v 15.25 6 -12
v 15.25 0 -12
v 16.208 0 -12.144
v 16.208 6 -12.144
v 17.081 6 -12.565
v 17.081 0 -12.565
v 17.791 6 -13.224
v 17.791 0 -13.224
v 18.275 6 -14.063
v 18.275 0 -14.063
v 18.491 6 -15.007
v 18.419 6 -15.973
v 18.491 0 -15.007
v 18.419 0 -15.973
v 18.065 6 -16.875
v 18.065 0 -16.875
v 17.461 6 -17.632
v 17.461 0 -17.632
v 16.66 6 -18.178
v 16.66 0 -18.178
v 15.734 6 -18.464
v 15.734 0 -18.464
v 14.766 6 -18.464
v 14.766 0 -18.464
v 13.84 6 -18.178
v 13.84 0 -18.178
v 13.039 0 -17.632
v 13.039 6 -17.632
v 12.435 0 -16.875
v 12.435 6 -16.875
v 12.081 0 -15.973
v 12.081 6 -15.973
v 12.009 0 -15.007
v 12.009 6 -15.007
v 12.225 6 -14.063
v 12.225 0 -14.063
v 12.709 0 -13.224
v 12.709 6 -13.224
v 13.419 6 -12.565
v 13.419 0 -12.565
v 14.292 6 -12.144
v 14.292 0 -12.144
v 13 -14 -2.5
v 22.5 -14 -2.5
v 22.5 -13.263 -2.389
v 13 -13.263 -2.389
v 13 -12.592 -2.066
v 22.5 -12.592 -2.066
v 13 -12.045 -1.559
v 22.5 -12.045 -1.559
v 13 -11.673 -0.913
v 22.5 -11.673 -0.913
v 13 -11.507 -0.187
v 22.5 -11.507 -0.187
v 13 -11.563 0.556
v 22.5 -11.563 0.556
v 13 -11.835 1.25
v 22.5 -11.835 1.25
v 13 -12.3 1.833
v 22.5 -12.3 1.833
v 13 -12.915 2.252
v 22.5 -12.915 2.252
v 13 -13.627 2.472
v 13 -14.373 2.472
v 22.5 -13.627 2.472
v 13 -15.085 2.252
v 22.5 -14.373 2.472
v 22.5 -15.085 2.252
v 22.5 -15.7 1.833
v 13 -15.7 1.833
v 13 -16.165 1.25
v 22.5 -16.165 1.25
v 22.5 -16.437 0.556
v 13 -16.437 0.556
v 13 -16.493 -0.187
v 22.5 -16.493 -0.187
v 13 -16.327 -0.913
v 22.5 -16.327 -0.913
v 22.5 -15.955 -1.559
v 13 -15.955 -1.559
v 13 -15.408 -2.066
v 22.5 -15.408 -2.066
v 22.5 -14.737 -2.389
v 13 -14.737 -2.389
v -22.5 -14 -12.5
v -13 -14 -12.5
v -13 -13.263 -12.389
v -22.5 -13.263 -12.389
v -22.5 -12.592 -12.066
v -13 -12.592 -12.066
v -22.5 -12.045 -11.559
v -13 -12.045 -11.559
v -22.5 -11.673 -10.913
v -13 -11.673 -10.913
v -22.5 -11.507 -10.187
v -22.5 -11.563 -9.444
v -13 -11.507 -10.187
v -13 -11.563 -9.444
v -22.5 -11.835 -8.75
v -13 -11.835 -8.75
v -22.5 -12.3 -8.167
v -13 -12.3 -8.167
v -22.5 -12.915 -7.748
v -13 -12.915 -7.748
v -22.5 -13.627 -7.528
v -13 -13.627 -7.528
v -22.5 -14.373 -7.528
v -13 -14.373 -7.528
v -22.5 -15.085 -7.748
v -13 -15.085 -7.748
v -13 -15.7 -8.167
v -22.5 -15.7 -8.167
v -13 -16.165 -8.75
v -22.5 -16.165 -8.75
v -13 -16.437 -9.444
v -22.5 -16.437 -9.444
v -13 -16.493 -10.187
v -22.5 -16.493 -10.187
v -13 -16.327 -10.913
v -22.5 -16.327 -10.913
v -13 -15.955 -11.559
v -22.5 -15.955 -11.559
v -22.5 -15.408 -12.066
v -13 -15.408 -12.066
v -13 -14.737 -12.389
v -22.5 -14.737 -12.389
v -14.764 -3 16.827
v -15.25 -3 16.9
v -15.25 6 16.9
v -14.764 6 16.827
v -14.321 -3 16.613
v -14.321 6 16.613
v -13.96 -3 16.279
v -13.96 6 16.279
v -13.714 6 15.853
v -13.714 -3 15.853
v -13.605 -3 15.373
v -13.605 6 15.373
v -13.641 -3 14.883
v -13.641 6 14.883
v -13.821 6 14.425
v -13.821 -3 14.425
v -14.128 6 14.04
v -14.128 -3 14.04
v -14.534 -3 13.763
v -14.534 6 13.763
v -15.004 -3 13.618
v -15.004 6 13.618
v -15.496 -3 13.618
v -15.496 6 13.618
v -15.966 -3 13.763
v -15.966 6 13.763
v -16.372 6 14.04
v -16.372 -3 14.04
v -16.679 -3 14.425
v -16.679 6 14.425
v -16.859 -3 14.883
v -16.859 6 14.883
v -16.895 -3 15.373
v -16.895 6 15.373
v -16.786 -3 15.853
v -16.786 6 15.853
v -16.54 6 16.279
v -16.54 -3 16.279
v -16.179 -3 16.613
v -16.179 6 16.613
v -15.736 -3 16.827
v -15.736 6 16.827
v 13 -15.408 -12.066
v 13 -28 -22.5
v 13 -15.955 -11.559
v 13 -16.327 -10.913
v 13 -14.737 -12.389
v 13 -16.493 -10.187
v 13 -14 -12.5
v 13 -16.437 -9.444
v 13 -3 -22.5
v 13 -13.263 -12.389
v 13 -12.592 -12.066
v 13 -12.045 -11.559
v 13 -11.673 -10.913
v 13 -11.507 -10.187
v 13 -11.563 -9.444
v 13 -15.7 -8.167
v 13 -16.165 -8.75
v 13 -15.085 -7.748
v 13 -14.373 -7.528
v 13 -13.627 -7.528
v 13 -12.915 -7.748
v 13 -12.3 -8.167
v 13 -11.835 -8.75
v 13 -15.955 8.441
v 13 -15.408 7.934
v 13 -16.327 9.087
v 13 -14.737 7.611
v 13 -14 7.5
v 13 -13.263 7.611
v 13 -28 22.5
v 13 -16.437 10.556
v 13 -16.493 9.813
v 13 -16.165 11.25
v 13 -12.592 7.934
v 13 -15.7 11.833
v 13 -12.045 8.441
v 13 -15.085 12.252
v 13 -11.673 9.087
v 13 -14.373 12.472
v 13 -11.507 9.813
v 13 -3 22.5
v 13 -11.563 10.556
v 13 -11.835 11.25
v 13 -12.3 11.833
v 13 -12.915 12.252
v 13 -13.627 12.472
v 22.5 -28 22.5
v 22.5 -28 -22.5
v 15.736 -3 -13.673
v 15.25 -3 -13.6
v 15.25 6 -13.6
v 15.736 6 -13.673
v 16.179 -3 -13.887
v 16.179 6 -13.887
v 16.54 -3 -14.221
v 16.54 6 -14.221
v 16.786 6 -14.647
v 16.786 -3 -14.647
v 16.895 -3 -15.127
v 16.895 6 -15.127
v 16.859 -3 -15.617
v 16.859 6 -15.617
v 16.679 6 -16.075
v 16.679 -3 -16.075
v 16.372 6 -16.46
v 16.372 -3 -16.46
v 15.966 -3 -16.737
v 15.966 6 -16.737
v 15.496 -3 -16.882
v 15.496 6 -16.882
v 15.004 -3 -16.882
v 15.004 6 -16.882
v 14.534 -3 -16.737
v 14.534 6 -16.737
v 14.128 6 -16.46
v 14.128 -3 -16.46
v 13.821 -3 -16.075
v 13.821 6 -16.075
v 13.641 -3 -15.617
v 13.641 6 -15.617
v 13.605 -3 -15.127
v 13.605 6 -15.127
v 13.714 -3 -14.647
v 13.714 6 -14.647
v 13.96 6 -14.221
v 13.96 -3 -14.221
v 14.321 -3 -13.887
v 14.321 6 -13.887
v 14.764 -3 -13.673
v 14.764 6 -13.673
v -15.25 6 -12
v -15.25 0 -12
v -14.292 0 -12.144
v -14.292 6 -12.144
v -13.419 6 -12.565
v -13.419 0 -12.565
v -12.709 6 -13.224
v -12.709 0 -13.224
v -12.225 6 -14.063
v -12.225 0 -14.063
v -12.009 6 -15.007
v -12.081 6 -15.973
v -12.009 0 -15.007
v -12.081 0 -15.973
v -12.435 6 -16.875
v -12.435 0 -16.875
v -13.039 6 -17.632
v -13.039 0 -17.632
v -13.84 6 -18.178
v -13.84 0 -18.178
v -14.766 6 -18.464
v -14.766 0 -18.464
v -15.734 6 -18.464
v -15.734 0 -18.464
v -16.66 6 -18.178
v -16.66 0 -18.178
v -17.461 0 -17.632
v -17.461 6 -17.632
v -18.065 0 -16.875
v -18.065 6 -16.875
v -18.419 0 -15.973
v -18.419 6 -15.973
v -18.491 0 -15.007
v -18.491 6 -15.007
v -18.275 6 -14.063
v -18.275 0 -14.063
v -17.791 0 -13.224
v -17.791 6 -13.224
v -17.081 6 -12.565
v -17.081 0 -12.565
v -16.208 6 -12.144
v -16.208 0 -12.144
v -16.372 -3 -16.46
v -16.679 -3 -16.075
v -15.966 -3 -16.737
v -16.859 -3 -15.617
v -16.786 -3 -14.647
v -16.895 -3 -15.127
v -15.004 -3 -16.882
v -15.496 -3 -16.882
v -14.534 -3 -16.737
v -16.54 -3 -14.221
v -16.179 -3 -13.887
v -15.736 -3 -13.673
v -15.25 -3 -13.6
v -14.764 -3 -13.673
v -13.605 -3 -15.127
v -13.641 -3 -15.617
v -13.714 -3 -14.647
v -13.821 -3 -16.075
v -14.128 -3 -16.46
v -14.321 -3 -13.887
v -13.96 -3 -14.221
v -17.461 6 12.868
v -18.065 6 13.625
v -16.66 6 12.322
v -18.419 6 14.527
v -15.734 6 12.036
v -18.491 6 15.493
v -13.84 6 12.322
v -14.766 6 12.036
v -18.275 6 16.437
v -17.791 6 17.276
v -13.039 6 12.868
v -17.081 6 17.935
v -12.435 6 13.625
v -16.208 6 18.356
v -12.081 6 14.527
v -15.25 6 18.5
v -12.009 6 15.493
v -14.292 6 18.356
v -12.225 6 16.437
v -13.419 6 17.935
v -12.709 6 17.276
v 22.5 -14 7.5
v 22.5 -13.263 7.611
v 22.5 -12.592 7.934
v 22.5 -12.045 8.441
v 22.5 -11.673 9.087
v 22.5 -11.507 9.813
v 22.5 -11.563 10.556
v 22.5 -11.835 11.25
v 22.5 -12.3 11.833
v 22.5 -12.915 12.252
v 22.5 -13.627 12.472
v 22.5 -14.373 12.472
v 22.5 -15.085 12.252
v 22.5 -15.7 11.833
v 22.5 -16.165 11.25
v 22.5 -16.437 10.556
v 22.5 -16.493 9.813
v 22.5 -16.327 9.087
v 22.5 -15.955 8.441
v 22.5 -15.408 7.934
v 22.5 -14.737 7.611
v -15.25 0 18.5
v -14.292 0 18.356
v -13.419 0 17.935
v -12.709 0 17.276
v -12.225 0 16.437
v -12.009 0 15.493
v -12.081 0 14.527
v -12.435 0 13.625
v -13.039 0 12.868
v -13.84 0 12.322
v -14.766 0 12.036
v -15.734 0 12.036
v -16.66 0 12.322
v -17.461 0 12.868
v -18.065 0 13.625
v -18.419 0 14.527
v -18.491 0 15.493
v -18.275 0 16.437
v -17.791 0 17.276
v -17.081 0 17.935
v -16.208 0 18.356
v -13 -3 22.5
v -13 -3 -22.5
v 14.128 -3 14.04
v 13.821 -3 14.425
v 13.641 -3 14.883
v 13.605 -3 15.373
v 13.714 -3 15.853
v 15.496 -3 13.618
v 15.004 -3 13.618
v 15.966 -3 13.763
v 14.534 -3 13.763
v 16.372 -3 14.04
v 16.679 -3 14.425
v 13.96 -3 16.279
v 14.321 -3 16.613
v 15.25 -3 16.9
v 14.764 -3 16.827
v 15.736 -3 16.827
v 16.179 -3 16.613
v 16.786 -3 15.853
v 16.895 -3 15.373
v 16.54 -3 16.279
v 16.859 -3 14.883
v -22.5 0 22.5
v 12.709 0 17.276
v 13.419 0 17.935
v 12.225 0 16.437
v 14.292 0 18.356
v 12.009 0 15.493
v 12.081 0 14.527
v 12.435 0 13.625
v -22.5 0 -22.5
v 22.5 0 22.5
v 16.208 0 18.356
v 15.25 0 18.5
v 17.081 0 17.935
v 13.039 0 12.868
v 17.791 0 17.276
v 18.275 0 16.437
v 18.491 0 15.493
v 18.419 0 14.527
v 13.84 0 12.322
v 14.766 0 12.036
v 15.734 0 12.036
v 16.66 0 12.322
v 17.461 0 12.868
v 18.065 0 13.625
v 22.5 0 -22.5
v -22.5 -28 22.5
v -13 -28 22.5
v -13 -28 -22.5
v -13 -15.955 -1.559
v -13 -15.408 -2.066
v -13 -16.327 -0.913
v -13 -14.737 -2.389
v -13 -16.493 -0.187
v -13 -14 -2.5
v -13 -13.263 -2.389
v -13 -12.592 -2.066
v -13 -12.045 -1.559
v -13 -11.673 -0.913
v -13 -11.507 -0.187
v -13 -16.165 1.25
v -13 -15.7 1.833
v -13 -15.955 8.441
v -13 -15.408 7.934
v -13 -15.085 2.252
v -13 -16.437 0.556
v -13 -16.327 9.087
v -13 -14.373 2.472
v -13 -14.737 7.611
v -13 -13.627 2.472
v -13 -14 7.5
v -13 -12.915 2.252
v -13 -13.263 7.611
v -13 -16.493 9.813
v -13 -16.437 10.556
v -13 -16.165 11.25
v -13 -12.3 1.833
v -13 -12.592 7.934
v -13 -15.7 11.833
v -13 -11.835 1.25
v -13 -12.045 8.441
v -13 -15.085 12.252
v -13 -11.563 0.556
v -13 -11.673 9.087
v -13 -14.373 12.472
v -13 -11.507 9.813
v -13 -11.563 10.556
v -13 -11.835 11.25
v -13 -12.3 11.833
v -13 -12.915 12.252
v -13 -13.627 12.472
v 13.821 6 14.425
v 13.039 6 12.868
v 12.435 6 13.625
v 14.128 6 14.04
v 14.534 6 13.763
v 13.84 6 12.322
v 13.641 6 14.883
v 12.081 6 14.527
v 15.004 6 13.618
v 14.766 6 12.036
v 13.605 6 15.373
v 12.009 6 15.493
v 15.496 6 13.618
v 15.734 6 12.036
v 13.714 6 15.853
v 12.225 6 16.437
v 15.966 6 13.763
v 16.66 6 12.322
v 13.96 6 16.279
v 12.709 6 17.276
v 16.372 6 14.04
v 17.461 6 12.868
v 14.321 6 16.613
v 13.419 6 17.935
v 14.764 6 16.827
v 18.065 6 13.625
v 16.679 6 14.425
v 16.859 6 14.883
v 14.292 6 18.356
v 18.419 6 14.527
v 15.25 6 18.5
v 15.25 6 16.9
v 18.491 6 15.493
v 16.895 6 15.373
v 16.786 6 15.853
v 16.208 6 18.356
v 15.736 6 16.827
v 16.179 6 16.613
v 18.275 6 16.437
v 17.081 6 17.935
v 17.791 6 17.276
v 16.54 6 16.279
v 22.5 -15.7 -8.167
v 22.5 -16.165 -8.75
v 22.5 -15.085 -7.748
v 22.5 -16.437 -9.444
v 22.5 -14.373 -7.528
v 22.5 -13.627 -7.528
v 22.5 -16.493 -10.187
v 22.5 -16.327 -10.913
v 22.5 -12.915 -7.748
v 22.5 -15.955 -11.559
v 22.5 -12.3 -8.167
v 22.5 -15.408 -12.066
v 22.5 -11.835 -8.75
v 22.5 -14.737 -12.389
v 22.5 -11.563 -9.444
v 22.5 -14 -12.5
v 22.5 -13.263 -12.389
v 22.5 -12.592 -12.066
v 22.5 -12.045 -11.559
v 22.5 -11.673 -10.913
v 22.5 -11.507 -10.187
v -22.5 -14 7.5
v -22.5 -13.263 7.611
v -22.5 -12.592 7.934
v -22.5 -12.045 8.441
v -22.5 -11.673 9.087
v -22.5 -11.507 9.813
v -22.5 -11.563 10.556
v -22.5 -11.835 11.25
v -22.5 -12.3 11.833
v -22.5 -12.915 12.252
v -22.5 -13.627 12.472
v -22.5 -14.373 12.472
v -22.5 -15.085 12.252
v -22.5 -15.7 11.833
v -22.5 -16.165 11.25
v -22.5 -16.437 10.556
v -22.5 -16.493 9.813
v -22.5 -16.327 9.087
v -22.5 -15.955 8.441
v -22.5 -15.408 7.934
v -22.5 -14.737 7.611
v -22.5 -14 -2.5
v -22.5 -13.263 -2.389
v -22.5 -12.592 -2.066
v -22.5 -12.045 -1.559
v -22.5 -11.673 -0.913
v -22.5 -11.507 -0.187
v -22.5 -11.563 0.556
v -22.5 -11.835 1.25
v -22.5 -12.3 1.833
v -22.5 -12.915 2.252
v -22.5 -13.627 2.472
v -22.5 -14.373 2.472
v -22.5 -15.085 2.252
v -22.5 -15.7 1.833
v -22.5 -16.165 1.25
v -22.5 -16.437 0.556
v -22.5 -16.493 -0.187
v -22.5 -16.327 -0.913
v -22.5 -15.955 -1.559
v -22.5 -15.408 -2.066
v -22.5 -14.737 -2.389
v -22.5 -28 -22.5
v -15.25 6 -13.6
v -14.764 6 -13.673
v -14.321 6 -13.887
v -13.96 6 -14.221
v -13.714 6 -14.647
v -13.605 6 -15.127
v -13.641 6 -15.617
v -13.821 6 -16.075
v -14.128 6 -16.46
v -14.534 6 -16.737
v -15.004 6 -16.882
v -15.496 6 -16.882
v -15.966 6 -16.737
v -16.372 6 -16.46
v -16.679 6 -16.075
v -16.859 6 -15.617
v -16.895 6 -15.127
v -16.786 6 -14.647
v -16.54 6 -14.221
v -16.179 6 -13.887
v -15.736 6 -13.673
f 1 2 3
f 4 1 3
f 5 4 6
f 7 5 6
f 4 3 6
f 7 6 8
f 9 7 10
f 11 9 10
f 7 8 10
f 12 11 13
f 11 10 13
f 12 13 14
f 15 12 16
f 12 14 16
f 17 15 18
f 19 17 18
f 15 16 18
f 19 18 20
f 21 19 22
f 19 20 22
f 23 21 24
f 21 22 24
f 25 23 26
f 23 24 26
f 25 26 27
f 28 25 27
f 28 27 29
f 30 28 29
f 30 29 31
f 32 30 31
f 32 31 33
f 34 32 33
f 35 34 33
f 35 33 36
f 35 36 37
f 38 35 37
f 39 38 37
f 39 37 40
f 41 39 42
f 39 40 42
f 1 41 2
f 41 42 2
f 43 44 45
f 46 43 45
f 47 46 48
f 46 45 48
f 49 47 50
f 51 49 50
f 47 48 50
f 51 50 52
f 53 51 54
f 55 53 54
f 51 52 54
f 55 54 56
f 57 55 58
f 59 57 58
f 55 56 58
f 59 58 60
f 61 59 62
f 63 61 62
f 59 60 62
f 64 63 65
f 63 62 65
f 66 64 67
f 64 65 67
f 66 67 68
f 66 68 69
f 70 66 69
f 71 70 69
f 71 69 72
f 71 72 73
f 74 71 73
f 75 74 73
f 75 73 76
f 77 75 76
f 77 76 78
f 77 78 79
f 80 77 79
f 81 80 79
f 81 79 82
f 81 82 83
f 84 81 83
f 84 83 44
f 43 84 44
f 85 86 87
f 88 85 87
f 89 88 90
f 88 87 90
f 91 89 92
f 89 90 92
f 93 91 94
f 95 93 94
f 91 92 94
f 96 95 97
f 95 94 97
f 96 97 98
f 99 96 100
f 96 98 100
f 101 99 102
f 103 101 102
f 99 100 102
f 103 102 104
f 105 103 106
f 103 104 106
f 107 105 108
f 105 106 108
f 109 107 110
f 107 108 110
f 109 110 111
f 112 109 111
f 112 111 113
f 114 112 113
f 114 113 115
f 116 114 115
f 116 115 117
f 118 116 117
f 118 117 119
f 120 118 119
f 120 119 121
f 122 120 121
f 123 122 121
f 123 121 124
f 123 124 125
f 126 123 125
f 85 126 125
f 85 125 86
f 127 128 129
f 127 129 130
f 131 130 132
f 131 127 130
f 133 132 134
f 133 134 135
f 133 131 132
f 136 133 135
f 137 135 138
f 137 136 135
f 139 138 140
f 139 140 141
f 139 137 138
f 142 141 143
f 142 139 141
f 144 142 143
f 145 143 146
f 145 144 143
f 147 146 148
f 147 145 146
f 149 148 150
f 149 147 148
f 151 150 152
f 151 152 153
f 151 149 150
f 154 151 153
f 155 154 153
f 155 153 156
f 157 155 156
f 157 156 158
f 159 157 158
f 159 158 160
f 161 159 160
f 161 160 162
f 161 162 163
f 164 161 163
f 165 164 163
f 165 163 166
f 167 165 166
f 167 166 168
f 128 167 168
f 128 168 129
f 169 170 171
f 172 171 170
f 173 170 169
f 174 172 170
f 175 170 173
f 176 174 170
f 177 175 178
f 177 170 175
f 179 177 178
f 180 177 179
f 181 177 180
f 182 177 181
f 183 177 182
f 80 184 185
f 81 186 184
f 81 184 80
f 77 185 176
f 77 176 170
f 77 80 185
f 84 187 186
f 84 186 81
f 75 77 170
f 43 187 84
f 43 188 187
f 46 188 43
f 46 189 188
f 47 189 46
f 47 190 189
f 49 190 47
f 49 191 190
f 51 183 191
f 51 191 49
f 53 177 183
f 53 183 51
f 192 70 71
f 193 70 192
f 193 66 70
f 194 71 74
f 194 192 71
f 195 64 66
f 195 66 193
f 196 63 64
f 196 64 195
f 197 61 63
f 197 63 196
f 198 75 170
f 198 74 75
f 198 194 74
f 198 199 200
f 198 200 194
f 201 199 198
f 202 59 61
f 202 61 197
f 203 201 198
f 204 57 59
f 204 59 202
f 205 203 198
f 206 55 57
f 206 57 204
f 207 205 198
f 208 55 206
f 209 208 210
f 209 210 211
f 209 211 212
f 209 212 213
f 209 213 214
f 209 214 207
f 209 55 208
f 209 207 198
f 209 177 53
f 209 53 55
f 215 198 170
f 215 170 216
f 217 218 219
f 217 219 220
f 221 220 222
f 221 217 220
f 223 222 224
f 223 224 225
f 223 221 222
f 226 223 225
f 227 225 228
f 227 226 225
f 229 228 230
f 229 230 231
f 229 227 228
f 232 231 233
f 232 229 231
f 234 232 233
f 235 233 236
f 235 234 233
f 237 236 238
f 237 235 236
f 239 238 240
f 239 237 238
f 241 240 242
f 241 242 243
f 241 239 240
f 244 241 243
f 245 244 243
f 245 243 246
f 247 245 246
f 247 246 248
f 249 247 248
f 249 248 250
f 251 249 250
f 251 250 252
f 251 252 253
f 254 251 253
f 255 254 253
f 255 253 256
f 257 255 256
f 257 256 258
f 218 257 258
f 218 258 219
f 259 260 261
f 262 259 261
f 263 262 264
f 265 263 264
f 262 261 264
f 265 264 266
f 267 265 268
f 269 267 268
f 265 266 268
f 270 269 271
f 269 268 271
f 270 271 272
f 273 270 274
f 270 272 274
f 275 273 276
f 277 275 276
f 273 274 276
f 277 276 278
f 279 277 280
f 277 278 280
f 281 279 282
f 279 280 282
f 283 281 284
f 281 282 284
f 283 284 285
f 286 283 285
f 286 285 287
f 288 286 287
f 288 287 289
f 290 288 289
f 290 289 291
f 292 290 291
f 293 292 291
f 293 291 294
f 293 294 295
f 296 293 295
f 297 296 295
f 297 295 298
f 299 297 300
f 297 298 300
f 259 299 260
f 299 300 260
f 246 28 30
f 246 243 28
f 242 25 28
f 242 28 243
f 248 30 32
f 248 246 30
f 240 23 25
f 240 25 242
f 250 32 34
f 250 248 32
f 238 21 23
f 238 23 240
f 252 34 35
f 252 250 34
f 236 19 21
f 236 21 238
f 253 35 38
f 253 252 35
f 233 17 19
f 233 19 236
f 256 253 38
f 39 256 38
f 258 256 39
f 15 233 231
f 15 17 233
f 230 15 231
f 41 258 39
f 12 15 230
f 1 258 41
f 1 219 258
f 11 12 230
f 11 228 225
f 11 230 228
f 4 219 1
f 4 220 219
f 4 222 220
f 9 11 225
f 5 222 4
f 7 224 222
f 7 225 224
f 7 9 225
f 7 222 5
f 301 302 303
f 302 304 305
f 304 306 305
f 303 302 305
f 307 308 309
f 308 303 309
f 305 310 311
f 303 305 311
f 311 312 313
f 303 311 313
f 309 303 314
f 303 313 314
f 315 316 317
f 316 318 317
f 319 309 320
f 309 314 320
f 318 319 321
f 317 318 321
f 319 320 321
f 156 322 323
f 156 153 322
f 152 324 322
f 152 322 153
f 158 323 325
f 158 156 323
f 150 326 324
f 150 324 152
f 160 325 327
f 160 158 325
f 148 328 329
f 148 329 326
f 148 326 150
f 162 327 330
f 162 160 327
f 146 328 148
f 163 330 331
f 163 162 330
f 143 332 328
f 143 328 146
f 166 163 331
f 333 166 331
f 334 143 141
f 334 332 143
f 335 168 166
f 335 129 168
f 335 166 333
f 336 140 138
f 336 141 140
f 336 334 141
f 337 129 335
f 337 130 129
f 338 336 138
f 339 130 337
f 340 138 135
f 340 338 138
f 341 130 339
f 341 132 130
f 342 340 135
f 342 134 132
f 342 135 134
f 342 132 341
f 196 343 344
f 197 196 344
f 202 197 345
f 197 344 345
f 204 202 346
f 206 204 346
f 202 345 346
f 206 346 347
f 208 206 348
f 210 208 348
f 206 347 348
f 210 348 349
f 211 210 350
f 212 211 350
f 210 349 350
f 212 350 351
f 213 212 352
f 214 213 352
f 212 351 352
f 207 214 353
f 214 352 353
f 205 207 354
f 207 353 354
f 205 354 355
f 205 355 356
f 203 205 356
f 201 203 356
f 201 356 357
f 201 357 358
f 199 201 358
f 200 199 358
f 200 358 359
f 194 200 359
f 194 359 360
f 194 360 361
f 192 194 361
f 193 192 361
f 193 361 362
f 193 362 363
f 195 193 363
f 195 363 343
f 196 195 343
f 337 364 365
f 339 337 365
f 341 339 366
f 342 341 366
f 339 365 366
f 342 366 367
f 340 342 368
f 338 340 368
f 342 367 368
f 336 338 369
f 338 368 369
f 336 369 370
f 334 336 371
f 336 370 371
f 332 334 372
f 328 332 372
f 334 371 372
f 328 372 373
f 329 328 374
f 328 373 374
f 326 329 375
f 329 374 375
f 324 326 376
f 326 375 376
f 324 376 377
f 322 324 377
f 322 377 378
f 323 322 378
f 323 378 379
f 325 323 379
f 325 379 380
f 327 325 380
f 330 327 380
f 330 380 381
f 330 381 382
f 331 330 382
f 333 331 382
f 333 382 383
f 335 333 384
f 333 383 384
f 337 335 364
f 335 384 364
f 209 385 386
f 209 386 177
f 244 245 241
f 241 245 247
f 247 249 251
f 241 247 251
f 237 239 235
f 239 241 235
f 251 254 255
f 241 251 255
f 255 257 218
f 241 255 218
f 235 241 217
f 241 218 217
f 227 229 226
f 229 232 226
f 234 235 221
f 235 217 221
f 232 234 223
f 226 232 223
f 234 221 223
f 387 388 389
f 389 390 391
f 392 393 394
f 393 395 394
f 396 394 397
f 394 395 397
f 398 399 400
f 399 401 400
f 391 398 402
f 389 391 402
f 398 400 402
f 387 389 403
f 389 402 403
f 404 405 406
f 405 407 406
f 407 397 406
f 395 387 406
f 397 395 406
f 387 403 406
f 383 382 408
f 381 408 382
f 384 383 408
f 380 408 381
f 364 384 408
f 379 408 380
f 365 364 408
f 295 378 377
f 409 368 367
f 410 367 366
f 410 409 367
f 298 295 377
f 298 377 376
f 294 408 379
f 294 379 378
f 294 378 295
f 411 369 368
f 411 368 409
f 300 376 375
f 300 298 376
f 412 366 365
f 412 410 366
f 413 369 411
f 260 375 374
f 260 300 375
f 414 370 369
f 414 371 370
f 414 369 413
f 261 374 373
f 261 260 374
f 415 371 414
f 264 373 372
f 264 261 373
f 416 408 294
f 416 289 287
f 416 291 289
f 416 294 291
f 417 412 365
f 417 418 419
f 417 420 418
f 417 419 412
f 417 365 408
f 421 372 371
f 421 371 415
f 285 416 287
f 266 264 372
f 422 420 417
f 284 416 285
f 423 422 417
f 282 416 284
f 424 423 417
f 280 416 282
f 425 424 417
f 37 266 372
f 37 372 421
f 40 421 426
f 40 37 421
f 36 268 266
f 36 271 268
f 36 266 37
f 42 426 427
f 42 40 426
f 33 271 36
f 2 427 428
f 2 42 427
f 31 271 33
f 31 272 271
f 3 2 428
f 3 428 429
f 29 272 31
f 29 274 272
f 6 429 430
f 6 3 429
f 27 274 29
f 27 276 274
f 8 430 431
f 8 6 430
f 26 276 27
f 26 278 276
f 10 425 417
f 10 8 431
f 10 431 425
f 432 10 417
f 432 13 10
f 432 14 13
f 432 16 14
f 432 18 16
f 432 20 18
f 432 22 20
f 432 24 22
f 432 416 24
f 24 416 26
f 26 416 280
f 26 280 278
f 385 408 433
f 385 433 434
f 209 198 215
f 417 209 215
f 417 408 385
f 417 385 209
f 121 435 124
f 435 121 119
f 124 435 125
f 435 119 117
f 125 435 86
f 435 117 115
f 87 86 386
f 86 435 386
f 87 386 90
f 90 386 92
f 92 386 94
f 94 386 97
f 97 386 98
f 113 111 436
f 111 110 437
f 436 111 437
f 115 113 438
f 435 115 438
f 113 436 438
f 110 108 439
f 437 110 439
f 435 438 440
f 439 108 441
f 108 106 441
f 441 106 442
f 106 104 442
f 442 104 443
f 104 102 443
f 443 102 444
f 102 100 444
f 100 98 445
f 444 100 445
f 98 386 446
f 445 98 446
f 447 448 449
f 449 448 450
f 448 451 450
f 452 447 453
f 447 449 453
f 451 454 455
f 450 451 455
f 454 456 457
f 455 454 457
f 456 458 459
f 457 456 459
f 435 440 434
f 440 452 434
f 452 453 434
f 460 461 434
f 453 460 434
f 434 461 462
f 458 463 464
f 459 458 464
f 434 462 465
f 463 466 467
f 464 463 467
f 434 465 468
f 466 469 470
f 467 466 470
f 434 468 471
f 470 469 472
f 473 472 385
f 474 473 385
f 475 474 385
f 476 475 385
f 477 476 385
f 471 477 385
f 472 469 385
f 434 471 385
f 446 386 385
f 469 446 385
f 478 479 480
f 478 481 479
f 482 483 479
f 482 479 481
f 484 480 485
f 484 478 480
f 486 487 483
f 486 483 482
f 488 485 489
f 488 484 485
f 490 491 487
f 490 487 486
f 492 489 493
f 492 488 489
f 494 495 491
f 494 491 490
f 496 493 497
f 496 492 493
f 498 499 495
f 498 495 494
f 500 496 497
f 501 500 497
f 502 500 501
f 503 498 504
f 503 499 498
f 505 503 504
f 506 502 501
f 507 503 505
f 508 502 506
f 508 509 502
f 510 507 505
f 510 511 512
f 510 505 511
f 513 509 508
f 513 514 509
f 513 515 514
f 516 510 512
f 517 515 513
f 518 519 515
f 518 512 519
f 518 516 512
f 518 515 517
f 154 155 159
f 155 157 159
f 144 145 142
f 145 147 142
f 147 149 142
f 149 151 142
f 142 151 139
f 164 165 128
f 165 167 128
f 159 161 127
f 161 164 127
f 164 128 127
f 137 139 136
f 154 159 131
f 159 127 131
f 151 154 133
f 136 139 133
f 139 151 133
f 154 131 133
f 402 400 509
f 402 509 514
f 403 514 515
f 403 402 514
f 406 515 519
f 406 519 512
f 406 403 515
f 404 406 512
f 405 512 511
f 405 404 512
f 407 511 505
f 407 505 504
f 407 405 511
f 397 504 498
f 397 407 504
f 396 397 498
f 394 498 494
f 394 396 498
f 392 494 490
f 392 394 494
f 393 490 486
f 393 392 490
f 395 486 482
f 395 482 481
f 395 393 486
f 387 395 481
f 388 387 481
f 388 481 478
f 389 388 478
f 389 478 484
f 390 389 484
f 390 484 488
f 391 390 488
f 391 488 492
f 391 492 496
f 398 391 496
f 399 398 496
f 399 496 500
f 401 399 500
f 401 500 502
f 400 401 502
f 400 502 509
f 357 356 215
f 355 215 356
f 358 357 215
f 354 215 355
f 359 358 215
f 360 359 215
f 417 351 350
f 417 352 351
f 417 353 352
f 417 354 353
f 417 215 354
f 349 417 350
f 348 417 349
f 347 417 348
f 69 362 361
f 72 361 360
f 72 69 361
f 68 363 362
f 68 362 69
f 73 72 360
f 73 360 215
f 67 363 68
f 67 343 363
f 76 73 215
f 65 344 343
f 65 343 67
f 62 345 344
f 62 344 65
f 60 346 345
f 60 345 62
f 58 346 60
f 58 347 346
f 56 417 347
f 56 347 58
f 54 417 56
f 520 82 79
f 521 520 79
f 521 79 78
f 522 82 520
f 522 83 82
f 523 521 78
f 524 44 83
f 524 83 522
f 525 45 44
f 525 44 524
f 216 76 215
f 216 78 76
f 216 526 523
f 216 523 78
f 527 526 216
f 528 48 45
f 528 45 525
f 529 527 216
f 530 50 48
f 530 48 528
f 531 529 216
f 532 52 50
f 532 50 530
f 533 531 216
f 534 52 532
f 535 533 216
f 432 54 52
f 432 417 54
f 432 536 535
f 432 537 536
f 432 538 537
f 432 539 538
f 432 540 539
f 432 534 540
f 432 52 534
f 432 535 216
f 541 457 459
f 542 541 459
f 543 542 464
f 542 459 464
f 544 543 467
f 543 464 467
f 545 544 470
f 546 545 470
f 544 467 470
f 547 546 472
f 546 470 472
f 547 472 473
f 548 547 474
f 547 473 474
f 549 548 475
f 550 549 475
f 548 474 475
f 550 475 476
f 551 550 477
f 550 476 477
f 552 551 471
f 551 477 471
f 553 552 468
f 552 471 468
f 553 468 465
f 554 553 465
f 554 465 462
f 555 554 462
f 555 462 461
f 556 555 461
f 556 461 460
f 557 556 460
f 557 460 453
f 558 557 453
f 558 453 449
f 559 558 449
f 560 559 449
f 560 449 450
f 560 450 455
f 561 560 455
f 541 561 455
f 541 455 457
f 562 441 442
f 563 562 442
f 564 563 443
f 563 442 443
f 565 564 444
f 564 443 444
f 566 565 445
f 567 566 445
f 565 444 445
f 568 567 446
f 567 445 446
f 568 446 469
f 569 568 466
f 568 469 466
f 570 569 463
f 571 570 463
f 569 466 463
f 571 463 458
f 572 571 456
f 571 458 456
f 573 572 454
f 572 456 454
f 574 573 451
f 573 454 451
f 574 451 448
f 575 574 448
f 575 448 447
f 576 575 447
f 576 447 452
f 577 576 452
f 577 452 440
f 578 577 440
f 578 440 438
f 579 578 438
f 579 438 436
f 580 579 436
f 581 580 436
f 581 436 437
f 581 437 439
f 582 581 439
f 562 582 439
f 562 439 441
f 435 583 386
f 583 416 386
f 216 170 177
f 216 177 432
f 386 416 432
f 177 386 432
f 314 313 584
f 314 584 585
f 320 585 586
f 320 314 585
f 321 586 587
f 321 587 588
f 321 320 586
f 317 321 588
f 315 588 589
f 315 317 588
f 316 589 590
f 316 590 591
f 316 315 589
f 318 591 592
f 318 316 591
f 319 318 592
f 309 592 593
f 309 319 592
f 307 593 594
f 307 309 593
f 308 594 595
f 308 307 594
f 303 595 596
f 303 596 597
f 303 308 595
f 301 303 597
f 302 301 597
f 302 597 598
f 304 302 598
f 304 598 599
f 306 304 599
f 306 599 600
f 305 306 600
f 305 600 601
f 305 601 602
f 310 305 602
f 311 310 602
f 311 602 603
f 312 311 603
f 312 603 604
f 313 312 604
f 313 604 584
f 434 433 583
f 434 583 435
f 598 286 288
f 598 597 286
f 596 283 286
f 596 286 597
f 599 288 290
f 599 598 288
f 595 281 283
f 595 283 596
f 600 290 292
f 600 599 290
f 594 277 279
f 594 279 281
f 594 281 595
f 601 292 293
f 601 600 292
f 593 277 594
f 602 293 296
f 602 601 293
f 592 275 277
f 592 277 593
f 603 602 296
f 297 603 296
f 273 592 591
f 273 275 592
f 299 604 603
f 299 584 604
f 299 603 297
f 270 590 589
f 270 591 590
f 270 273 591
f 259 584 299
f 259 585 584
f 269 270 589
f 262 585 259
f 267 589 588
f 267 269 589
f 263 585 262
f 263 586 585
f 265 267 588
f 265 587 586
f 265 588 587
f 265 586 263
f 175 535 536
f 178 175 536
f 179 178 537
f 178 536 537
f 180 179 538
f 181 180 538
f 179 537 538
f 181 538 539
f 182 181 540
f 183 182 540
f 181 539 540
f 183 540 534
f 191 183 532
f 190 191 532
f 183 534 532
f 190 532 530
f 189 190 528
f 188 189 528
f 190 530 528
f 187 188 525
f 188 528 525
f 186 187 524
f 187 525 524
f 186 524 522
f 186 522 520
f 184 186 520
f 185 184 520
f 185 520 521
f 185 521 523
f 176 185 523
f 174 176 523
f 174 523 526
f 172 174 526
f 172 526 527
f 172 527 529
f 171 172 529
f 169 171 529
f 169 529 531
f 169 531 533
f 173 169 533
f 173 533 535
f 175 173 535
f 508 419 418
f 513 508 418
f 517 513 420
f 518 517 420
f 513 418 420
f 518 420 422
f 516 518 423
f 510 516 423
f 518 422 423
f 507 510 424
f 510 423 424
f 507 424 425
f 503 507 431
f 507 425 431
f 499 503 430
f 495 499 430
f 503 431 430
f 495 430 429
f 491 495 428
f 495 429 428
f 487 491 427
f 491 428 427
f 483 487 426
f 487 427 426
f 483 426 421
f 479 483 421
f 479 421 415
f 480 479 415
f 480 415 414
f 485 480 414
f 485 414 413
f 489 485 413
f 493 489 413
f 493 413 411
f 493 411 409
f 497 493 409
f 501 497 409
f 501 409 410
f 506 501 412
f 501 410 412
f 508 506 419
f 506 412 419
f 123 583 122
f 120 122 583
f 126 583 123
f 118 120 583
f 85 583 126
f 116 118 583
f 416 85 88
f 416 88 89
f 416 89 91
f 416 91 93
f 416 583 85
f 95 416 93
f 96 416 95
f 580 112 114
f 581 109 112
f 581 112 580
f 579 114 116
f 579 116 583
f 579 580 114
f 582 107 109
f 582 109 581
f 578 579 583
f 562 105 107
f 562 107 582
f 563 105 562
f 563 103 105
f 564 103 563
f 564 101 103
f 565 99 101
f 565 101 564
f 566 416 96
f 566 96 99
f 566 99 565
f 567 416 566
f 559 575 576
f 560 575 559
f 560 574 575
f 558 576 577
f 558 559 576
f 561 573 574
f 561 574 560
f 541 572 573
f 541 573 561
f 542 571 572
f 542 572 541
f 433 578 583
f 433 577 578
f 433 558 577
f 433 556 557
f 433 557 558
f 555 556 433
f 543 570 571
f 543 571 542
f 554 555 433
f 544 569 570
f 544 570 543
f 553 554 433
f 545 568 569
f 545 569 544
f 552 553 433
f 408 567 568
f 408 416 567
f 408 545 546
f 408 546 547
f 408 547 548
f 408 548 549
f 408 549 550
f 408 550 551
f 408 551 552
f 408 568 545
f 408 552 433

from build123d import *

# Parameters (mm, degrees)
SKETCH1_R             = 3.25
SKETCH1_R_2           = 1.65
BOSS_EXTRUDE1_DEPTH   = 6
BOSS_EXTRUDE1_2_DEPTH = 6
BOSS_EXTRUDE1_3_DEPTH = 6
BOSS_EXTRUDE1_4_DEPTH = 6
SKETCH2_W             = 45
SKETCH2_H             = 45
BOSS_EXTRUDE2_DEPTH   = 3
CUT_EXTRUDE1_START    = -3
SKETCH1_2_R           = 1.65
CUT_EXTRUDE1_DEPTH    = 3
SKETCH7_W             = 9.5
SKETCH7_H             = 45
BOSS_EXTRUDE3_DEPTH   = 25
SKETCH8_R             = 2.5
CUT_EXTRUDE2_DEPTH    = 58.578207683


with BuildPart() as part:
    # Sketch1 → Boss-Extrude1 (new body)
    with BuildSketch(Plane(origin=(0, 0, 0), x_dir=(1, 0, 0), z_dir=(0, 1, 0))):
        with Locations((-15.25, 15.25)):
            Circle(SKETCH1_R)
        with Locations((-15.25, 15.25)):
            Circle(SKETCH1_R_2, mode=Mode.SUBTRACT)
    extrude(amount=BOSS_EXTRUDE1_DEPTH)



with BuildPart() as body_2:
    # Sketch1 → Boss-Extrude1 2 (new body)
    with BuildSketch(Plane(origin=(0, 0, 0), x_dir=(1, 0, 0), z_dir=(0, 1, 0))):
        with Locations((15.25, 15.25)):
            Circle(SKETCH1_R)
        with Locations((15.25, 15.25)):
            Circle(SKETCH1_R_2, mode=Mode.SUBTRACT)
    extrude(amount=BOSS_EXTRUDE1_2_DEPTH)


with BuildPart() as body_3:
    # Sketch1 → Boss-Extrude1 3 (new body)
    with BuildSketch(Plane(origin=(0, 0, 0), x_dir=(1, 0, 0), z_dir=(0, 1, 0))):
        with Locations((15.25, -15.25)):
            Circle(SKETCH1_R)
        with Locations((15.25, -15.25)):
            Circle(SKETCH1_R_2, mode=Mode.SUBTRACT)
    extrude(amount=BOSS_EXTRUDE1_3_DEPTH)


with BuildPart() as body_4:
    # Sketch1 → Boss-Extrude1 4 (new body)
    with BuildSketch(Plane(origin=(0, 0, 0), x_dir=(1, 0, 0), z_dir=(0, 1, 0))):
        with Locations((-15.25, -15.25)):
            Circle(SKETCH1_R)
        with Locations((-15.25, -15.25)):
            Circle(SKETCH1_R_2, mode=Mode.SUBTRACT)
    extrude(amount=BOSS_EXTRUDE1_4_DEPTH)


with BuildPart() as part_1:
    add(part.part)

    add(body_2.part)  # Boss-Extrude2 merges body 2

    add(body_3.part)  # Boss-Extrude2 merges body 3

    add(body_4.part)  # Boss-Extrude2 merges body 4
    # Sketch2 → Boss-Extrude2 (add)
    with BuildSketch(Plane(origin=(0, 0, 0), x_dir=(1, 0, 0), z_dir=(0, 1, 0))):
        Rectangle(SKETCH2_W, SKETCH2_H)
    extrude(amount=-BOSS_EXTRUDE2_DEPTH)

    # Sketch1<2> → Cut-Extrude1 (cut)
    with BuildSketch(Plane(origin=(0, 0, 0), x_dir=(1, 0, 0), z_dir=(0, 1, 0)).offset(CUT_EXTRUDE1_START)):
        with Locations((-15.25, 15.25)):
            Circle(SKETCH1_2_R)
        with Locations((15.25, 15.25)):
            Circle(SKETCH1_2_R)
        with Locations((15.25, -15.25)):
            Circle(SKETCH1_2_R)
        with Locations((-15.25, -15.25)):
            Circle(SKETCH1_2_R)
    extrude(amount=CUT_EXTRUDE1_DEPTH, mode=Mode.SUBTRACT)

    # Sketch7 → Boss-Extrude3 (add)
    with BuildSketch(Plane.XZ.offset(3)):
        with Locations((-17.75, 0)):
            Rectangle(SKETCH7_W, SKETCH7_H)
        with Locations((17.75, 0)):
            Rectangle(SKETCH7_W, SKETCH7_H)
    extrude(amount=BOSS_EXTRUDE3_DEPTH)

    # Sketch8 → Cut-Extrude2 (cut, through all)
    with BuildSketch(Plane(origin=(22.5, 0, 0), x_dir=(0, 0, -1), z_dir=(1, 0, 0))):
        with Locations((0, -14)):
            Circle(SKETCH8_R)
        with Locations((-10, -14)):
            Circle(SKETCH8_R)
        with Locations((10, -14)):
            Circle(SKETCH8_R)
    extrude(amount=-CUT_EXTRUDE2_DEPTH, mode=Mode.SUBTRACT)


solid = part_1.part
